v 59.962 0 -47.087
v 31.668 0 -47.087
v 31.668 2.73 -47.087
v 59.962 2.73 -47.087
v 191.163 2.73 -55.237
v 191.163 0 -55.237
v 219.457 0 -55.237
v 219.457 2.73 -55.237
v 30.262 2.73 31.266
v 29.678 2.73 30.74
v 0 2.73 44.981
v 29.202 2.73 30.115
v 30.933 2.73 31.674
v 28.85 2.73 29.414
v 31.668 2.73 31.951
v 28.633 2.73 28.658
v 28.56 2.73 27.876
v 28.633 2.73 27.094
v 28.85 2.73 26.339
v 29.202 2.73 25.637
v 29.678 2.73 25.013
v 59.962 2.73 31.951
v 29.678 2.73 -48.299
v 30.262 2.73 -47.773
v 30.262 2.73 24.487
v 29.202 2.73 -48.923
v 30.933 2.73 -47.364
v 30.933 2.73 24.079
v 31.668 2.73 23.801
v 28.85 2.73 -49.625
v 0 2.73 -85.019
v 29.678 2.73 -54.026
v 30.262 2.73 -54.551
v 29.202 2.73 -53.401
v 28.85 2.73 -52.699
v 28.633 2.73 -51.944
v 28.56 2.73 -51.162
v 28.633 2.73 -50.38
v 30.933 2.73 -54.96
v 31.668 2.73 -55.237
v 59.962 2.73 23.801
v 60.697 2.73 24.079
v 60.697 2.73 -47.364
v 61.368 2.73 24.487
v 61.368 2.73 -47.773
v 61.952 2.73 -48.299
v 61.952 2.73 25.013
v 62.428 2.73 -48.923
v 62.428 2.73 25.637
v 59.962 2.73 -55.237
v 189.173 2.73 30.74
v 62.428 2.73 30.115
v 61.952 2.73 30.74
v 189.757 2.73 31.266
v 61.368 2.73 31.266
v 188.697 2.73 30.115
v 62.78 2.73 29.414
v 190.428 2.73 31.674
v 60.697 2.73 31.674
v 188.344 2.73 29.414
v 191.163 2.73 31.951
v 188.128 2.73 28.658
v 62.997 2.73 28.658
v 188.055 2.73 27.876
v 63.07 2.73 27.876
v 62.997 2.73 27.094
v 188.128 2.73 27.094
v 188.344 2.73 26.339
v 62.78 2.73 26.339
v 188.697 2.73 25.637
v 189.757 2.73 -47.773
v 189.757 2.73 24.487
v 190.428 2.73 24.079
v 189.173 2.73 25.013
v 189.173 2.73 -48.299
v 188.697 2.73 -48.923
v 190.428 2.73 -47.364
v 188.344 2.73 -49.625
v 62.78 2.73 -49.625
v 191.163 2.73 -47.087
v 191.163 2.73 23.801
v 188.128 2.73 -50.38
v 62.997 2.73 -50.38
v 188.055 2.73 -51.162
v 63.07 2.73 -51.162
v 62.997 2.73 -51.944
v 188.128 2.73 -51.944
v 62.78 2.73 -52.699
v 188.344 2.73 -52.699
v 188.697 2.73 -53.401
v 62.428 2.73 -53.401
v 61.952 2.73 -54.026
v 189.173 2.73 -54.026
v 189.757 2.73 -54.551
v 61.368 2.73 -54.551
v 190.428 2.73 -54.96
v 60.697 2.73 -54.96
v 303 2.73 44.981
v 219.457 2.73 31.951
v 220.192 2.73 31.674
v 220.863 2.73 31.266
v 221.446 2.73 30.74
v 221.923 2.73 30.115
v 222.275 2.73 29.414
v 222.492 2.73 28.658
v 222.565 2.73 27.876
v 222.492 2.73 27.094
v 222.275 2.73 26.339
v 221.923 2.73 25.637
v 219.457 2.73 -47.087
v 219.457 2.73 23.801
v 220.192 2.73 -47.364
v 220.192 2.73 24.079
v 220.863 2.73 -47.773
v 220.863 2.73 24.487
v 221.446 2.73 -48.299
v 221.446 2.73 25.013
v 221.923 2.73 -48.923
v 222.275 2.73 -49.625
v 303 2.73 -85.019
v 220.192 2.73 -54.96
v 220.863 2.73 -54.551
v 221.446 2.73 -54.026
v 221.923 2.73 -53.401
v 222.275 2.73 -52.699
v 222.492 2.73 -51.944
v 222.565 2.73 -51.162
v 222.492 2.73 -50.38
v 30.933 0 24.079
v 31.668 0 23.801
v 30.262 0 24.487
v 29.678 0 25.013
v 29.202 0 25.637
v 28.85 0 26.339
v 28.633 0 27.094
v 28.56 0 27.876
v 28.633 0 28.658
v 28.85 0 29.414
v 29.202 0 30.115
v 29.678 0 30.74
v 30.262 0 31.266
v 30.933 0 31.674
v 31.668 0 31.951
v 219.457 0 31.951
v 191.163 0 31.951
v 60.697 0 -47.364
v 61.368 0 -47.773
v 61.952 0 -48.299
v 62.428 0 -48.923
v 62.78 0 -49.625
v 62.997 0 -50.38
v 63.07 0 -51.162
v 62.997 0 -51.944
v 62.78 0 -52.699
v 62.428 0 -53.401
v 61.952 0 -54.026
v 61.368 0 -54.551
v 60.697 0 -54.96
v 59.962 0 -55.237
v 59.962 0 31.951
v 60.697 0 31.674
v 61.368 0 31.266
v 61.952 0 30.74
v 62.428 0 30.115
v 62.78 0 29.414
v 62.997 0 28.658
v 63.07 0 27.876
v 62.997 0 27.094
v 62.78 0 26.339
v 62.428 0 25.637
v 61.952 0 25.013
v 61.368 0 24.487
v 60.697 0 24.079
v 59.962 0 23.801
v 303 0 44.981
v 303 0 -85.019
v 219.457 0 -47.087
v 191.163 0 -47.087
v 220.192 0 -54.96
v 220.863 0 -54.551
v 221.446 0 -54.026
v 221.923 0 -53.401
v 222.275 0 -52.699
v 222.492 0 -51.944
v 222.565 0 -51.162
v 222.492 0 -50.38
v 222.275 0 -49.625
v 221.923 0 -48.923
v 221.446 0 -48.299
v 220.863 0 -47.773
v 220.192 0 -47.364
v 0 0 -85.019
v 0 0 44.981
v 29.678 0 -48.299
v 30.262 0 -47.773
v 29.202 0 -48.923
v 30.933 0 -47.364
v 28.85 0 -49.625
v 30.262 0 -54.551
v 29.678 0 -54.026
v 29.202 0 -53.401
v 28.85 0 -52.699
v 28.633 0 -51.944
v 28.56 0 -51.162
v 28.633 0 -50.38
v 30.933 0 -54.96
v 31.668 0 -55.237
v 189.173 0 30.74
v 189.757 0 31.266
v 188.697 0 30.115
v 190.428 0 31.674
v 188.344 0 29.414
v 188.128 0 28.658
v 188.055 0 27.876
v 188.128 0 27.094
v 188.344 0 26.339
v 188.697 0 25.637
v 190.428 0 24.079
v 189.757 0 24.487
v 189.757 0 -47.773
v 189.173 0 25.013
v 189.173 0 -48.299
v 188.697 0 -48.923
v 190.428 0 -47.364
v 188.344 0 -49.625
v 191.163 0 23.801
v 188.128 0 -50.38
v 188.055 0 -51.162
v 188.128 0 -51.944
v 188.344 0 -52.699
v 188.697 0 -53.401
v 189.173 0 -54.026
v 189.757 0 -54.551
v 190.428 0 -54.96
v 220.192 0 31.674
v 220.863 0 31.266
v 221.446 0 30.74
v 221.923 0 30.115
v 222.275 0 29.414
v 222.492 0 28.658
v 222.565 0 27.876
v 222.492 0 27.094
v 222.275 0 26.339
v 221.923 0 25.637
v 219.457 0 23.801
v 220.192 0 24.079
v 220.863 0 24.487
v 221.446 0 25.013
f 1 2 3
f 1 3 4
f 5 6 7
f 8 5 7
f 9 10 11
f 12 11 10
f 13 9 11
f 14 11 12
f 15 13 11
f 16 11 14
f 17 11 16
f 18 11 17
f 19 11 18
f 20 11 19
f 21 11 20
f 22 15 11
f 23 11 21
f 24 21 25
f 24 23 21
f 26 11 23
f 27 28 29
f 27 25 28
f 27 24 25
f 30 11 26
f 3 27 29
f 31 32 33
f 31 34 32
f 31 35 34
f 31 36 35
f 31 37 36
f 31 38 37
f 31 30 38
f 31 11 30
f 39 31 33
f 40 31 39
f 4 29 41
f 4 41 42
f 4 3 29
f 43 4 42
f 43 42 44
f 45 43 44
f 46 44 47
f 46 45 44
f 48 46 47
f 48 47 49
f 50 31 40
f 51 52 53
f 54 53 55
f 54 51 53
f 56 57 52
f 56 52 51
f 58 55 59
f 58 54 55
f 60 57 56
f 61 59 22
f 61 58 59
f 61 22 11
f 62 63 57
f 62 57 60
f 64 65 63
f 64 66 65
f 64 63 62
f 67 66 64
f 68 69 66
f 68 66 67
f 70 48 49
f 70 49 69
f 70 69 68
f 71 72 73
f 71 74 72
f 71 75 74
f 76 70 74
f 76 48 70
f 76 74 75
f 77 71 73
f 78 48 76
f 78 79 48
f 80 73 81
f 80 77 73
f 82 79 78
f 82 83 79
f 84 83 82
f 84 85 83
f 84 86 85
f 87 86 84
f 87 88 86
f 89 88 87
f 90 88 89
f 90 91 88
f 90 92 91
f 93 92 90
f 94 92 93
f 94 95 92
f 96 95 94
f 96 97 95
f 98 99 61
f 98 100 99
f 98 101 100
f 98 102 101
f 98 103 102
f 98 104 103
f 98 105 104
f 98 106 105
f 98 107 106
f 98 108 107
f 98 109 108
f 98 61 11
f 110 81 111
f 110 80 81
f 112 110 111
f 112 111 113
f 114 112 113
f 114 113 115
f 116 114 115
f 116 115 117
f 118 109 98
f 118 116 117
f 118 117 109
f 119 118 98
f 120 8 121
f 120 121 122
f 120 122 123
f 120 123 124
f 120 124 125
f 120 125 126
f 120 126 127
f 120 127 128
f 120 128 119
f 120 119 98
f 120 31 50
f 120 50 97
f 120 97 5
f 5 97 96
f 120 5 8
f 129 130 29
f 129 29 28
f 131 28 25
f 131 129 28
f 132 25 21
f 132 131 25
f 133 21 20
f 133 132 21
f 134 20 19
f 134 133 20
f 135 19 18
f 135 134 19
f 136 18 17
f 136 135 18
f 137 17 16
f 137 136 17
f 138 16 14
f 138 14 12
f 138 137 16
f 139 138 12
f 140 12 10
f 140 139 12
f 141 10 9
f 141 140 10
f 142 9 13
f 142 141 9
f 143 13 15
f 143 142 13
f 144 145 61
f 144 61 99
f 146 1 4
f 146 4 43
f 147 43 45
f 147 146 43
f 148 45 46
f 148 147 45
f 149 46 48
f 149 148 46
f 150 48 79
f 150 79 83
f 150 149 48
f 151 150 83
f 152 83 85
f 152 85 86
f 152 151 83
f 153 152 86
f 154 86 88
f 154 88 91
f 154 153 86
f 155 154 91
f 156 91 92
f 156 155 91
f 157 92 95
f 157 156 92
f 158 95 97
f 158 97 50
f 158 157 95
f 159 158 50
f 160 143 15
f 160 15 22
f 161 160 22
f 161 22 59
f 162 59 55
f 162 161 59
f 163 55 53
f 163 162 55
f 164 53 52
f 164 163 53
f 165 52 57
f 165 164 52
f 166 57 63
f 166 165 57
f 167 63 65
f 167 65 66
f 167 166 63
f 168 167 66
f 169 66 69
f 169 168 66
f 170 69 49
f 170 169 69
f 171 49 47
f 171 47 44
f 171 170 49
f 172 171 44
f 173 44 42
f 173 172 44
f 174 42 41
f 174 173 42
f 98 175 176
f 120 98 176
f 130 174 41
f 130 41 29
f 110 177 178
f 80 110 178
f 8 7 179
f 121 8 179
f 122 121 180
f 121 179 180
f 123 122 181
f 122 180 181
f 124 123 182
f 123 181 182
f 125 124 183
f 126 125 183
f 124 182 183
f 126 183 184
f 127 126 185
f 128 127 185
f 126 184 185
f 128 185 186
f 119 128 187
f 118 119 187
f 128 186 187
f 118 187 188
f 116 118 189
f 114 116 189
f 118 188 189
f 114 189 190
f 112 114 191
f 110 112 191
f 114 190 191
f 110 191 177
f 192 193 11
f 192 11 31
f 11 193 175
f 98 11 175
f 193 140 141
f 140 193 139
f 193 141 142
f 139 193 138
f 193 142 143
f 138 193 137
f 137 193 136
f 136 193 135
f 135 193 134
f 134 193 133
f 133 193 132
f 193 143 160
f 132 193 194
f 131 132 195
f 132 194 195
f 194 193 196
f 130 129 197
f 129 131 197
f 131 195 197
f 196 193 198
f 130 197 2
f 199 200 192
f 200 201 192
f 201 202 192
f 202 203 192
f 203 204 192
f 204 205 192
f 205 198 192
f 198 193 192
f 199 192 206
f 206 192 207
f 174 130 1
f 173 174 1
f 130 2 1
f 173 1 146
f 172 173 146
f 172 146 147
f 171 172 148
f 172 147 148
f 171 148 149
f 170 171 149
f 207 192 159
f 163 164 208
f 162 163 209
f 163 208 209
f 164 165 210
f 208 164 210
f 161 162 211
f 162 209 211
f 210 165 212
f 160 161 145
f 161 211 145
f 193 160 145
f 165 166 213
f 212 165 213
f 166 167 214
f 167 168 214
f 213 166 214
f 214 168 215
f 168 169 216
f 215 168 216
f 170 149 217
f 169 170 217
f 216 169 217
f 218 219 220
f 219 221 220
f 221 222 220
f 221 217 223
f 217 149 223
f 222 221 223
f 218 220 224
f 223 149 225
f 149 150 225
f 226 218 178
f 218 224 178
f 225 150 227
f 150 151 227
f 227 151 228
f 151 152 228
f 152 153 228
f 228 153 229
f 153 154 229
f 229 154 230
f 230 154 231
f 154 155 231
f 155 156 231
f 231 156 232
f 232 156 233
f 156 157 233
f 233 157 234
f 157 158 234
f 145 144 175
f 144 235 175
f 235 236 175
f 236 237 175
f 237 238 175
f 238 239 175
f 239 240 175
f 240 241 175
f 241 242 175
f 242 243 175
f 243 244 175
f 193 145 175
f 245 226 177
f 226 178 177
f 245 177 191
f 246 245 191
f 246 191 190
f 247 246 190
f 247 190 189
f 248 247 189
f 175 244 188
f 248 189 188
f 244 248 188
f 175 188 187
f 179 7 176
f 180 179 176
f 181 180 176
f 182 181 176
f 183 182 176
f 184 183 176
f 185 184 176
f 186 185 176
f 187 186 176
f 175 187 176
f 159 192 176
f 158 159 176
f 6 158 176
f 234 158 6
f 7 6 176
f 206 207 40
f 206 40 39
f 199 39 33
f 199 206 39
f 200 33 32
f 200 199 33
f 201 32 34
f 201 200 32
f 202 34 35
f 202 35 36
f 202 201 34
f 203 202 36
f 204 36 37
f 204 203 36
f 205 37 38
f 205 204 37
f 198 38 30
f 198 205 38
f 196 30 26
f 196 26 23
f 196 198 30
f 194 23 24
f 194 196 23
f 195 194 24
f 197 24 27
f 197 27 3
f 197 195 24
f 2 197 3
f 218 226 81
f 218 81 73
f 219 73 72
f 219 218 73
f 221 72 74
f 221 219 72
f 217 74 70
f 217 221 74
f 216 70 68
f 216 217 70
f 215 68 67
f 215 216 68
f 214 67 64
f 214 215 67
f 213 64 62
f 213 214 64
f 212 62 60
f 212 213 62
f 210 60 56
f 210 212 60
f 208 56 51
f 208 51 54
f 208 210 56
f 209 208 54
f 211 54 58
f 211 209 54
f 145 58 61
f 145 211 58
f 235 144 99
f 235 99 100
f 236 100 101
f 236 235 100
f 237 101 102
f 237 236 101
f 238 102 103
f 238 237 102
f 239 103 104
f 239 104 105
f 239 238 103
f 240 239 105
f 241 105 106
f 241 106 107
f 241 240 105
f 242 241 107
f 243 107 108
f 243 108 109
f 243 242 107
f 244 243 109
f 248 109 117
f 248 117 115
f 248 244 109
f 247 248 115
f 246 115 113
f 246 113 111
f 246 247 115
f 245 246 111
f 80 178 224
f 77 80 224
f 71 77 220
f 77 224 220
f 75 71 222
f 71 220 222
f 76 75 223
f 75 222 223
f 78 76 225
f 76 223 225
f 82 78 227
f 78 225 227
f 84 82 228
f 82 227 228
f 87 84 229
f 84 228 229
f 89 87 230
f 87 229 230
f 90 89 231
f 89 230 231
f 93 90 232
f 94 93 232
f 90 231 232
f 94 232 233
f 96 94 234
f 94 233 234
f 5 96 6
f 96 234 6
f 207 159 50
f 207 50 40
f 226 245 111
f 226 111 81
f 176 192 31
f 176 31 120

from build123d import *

# Parameters (mm, degrees)
SKETCH1_W           = 303
SKETCH1_H           = 130
BOSS_EXTRUDE1_DEPTH = 2.73


with BuildPart() as part:
    # Sketch1 → Boss-Extrude1 (new body)
    with BuildSketch(Plane(origin=(0, 0, 0), x_dir=(1, 0, 0), z_dir=(0, 1, 0))):
        with Locations((151.5, 20.018589385)):
            Rectangle(SKETCH1_W, SKETCH1_H)
        with BuildLine():
            Line((31.667883176, -31.951410615), (59.962116824, -31.951410615))
            ThreePointArc((59.962116824, -31.951410615), (63.07, -27.876410615), (59.962116824, -23.801410615))
            Line((59.962116824, -23.801410615), (31.667883176, -23.801410615))
            ThreePointArc((31.667883176, -23.801410615), (28.56, -27.876410615), (31.667883176, -31.951410615))
        make_face(mode=Mode.SUBTRACT)
        with BuildLine():
            Line((191.162705572, 55.23720125), (219.45693922, 55.23720125))
            ThreePointArc((219.45693922, 55.23720125), (222.564822396, 51.16220125), (219.45693922, 47.08720125))
            Line((219.45693922, 47.08720125), (191.162705572, 47.08720125))
            ThreePointArc((191.162705572, 47.08720125), (188.054822396, 51.16220125), (191.162705572, 55.23720125))
        make_face(mode=Mode.SUBTRACT)
        with BuildLine():
            Line((31.667883176, 47.08720125), (59.962116824, 47.08720125))
            ThreePointArc((59.962116824, 47.08720125), (63.07, 51.16220125), (59.962116824, 55.23720125))
            Line((59.962116824, 55.23720125), (31.667883176, 55.23720125))
            ThreePointArc((31.667883176, 55.23720125), (28.56, 51.16220125), (31.667883176, 47.08720125))
        make_face(mode=Mode.SUBTRACT)
        with BuildLine():
            Line((191.162705572, -31.951410615), (219.45693922, -31.951410615))
            ThreePointArc((219.45693922, -31.951410615), (222.564822396, -27.876410615), (219.45693922, -23.801410615))
            Line((219.45693922, -23.801410615), (191.162705572, -23.801410615))
            ThreePointArc((191.162705572, -23.801410615), (188.054822396, -27.876410615), (191.162705572, -31.951410615))
        make_face(mode=Mode.SUBTRACT)
    extrude(amount=BOSS_EXTRUDE1_DEPTH)


solid = part.part
